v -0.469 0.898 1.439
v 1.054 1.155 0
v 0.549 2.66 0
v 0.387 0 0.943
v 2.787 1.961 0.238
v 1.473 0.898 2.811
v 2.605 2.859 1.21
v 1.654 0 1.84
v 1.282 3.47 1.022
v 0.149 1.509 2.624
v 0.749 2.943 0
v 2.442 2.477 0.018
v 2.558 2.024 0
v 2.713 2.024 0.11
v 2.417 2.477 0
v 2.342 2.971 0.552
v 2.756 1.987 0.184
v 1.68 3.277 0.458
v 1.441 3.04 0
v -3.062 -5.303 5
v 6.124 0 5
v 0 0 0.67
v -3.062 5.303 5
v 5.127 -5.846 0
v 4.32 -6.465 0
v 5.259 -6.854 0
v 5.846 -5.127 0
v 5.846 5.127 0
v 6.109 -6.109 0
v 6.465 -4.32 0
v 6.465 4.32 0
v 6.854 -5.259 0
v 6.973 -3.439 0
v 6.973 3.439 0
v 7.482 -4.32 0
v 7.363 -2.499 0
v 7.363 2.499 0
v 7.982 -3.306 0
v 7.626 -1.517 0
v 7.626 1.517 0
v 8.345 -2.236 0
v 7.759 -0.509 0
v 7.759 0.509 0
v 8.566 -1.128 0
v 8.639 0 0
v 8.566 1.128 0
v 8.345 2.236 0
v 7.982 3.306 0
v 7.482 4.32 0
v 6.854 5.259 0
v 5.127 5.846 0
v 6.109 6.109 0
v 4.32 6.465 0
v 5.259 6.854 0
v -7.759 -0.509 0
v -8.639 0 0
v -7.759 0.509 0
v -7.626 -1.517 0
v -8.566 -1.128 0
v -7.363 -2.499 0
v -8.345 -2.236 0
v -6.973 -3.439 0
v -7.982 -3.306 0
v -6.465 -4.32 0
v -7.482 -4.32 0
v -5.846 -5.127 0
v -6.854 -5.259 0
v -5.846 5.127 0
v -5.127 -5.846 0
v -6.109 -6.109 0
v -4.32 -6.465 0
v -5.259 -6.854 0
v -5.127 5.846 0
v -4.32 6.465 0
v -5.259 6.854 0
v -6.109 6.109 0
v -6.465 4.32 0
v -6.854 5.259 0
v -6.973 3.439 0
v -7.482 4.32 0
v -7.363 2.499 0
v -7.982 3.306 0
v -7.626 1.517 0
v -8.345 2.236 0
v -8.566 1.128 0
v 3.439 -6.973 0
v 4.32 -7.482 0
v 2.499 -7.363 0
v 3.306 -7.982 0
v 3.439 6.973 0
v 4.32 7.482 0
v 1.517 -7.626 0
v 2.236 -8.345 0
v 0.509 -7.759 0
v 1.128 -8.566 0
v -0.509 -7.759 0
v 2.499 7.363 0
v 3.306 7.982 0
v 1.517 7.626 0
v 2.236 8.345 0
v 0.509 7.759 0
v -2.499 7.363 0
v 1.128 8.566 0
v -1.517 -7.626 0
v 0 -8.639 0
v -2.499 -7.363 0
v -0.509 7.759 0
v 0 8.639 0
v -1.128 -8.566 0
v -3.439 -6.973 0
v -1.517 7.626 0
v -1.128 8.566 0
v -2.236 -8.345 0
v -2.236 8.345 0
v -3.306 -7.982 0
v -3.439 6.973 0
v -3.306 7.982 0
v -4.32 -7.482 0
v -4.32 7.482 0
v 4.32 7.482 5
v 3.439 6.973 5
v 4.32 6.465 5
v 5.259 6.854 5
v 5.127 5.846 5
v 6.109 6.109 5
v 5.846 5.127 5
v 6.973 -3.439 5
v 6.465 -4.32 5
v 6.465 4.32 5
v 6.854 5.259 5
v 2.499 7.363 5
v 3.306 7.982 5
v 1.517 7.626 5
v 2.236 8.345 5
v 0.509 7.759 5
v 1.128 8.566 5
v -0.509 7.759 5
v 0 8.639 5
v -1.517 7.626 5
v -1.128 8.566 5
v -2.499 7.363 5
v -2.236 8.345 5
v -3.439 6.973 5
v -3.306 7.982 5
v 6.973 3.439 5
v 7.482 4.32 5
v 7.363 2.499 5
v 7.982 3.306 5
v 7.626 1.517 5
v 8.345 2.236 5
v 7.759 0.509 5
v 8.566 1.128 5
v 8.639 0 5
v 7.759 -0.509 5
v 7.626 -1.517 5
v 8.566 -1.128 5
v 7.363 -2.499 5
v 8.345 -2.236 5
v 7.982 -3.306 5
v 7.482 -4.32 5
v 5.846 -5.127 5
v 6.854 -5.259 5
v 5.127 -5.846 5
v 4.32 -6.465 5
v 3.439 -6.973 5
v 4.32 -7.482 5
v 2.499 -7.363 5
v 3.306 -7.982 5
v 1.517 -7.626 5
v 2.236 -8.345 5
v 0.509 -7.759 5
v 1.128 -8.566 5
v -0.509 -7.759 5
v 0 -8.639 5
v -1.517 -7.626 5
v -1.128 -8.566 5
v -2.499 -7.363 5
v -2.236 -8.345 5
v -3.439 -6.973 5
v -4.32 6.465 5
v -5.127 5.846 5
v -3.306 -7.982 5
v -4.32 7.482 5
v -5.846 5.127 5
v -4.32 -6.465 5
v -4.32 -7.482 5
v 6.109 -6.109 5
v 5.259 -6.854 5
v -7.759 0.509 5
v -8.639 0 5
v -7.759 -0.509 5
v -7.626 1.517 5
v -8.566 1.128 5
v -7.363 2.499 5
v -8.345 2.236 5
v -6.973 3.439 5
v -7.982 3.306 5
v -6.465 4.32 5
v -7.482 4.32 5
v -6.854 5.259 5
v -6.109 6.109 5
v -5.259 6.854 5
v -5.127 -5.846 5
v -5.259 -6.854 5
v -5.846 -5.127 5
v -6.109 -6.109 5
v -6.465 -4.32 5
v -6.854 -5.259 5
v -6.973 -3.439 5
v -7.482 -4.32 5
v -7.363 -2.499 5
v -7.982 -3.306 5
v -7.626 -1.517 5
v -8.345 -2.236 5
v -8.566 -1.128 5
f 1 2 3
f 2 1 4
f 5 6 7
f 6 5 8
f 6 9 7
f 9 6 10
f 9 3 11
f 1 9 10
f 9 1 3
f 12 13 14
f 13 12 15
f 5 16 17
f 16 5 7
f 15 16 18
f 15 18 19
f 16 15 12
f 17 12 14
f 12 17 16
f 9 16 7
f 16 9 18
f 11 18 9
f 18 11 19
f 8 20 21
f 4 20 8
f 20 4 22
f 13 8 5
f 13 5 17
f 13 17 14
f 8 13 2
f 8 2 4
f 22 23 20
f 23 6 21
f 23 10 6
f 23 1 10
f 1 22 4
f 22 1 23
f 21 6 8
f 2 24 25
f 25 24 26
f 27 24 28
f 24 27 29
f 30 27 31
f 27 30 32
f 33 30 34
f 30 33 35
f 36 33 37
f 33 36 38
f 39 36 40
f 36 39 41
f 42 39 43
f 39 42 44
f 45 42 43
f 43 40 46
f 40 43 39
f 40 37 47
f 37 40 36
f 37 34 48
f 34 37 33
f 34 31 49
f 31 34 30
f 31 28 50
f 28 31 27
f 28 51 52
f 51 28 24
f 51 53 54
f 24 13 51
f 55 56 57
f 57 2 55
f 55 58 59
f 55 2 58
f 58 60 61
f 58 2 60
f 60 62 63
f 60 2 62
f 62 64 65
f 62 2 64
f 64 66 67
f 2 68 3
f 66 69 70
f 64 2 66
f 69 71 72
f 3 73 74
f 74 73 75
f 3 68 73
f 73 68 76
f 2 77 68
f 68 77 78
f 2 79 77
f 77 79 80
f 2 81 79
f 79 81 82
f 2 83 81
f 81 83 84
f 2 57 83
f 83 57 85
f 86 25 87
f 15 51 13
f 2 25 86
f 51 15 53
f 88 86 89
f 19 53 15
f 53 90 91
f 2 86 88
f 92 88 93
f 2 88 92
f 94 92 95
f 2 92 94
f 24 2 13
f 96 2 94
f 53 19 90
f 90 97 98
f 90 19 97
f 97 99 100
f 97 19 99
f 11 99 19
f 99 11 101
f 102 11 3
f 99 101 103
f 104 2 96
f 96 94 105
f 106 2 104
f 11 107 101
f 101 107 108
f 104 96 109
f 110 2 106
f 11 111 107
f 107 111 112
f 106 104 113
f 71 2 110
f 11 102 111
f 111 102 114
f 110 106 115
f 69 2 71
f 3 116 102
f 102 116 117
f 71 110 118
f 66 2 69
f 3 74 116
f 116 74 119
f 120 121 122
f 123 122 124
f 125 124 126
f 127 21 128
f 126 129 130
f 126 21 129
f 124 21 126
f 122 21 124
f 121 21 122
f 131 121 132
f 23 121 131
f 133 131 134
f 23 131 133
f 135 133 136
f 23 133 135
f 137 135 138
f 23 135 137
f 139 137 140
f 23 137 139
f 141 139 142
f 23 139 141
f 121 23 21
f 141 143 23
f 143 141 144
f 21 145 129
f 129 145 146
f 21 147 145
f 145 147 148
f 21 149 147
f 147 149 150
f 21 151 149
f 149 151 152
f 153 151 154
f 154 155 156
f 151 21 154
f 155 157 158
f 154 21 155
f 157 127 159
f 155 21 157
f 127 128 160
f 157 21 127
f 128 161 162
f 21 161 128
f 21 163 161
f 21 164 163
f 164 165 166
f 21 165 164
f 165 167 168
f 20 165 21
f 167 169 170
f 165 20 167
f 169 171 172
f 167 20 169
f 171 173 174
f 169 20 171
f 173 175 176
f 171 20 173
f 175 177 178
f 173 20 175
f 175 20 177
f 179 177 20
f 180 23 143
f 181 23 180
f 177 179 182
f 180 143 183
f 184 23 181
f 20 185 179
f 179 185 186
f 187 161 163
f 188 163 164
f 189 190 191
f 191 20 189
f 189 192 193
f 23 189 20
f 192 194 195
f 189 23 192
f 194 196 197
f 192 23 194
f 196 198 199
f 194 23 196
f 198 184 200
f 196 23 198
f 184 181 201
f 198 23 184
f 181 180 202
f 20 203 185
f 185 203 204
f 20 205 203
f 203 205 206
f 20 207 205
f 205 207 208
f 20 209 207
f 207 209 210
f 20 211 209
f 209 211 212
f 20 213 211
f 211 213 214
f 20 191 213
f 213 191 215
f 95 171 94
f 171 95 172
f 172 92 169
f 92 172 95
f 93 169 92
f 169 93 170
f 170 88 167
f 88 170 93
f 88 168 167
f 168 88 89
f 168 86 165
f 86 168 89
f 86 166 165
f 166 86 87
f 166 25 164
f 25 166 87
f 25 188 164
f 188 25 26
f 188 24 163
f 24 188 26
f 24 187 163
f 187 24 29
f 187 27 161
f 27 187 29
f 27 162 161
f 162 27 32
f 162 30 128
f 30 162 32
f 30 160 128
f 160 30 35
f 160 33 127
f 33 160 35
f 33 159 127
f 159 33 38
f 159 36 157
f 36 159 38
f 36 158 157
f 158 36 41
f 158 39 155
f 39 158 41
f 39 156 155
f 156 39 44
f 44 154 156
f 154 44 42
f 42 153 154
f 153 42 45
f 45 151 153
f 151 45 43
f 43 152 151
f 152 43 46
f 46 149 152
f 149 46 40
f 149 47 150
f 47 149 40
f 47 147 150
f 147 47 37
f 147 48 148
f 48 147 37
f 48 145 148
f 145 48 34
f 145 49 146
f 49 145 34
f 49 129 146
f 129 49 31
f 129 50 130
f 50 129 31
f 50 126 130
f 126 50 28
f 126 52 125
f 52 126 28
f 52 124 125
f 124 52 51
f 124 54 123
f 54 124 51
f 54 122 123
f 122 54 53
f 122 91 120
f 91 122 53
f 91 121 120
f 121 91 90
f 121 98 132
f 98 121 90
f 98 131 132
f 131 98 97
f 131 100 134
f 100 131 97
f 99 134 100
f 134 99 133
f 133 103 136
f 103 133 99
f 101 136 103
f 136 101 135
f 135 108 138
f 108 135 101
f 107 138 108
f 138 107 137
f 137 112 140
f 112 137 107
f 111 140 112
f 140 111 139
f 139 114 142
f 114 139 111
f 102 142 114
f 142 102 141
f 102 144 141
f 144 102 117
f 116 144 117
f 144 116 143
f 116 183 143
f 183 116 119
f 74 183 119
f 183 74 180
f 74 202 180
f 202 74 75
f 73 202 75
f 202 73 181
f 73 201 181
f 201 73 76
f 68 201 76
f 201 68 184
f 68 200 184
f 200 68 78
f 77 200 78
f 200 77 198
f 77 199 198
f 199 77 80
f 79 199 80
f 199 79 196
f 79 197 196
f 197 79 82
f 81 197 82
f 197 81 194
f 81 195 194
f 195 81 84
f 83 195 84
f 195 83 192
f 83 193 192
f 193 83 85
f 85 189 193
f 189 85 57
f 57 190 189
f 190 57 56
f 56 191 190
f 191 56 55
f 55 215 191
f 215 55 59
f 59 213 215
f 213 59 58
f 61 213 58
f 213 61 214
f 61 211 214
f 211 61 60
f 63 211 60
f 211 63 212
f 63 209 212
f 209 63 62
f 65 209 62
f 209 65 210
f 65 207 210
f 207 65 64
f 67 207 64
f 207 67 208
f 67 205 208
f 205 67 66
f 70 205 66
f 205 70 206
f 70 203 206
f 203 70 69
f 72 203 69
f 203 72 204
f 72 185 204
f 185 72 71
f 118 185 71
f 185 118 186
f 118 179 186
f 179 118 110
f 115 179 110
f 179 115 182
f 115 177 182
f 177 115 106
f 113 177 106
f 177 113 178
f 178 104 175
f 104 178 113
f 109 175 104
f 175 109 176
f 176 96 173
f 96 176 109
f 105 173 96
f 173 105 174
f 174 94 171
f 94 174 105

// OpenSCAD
// file: belt.scad
/**
 * Copyright 2018 Mike and Nathan Fairhurst. See LICENSE for licensing.
 */
include <constants.scad>;
use <util.scad>;

// Begin how to print this piece (orientation, etc)

// Begin modules that can be used to assemble this piece in solver_3.scad

// A simple belt preview module. Simply accepts some number of gears, and
// builds a belt that connects them.
//
// Example: a 2mm thick belt connecting three gears in a square
//   belt(2) mirrored([x, y]) gear(.5, 30, 5);
//
// Doesn't yet draw the teeth, and makes some assumptions:
// - Assumes all gears are level in the z axis
// - Assumes all gears are the same thickness
// - Has the same limitations as [hull] (assumes no backtracking).
module belt(size=2) {
  difference() {
    hull() minkowski() {
      children();
      cylinder(0.00001, r=size);
    }
    down(0.1) scale([1,1,2]) hull() children();
  }
}

// This an approximation for a transcendental equation, but seems to work well
// see this post: https://math.stackexchange.com/questions/123361
function gear_center_distance(belt_length, gear_size1, gear_size2) =
  let(diff=abs(gear_size1 - gear_size2))
  let(tangent_length=
    (belt_length - PI*diff + sqrt(sqr(PI*diff - belt_length) - 16*sqr(diff))) / 4)
  sqrt(sqr(diff) + sqr(tangent_length));
// file: arm.scad
/**
 * Copyright 2018 Mike and Nathan Fairhurst. See LICENSE for licensing.
 */
include <constants.scad>;
use <util.scad>;
use <gear.scad>;

// Begin config specific to this piece.
arm_length = 100;
width = 20;
grip_width = 2;
extend_retract_gear_size = 1;

// Begin how to print this piece (orientation, etc)
rotate([0, 90, 0]) arm();

// Begin modules that can be used to assemble this piece in solver_3.scad
module arm(include_gears=true) {
  rotate([0, 270, 0]) {
    translate([0, 0, cube_size/2])
      if (include_gears)
        opposing_gears(arm_length, width, extend_retract_gear_size);
      else cylinder(d=width, arm_length);
    difference() {
      translate([0, 0, cube_size/3/2 + grip_width / 2])
        ccube([
          cube_size + grip_width * 2,
          cube_size / 3,
          cube_size/3 * 2 + grip_width
        ], x + y + z);
      ccube(cube_size, x + y + z);
    }
  }

}

module opposing_gears(length, width, extend_retract_gear_size) {
  intersection() {
    fixed_outer_size_gear(width, 10, length);
    ccube([width, width, length], y);
  }
  difference() {
    movable_cylinder(extend_retract_gear_size, width, length);
    ccube([width, width, length], y);
  }
}

module movable_cylinder(teeth_size = 1, width = width, length=arm_length) {
  iters = floor(length / teeth_size);

  radial_offset = gear_tooth_additional_radius(teeth_size) + teeth_size /2;

  intersection() {
    // restrict to the actual length
    ccube([width, width, length], x+y);
    // each tooth
    for (i=[0:iters]) {
      up(i * teeth_size)
      rotate_extrude()
      translate([width / 2 - radial_offset, 0, 0])
      circle(teeth_size, $fn=3);
    }
  }

  // without this its hollow
  cylinder(r=width / 2 - radial_offset, h=length);
}
// file: pin.scad
/**
 * Copyright 2018 Mike and Nathan Fairhurst. See LICENSE for licensing.
 */
include <constants.scad>;
use <util.scad>;

pin(10,2);

// A shape that can be used for push in parts
module pin(height, radius) {
  inner_height = height * 0.9375;
  cap_height = height - inner_height;
  difference() {
    translate([radius*sqrt(2)/2, 0, 0])
      union() {
        cylinder(h=inner_height, r=radius);
        up(inner_height)
          cylinder(h=cap_height, r1=radius, r2=radius/2);
      }
    translate([-height*2, 0, 0])
      ccube(height*2, y + z);
  }
}
// file: frame.scad
/**
 * Copyright 2018 Mike and Nathan Fairhurst. See LICENSE for licensing.
 */
include <constants.scad>;
use <util.scad>;
use <cube_holder.scad>;
use <arm.scad>;
use <belt.scad>;

thickness = 4;
width = 30;
height_at_front = 120;
height_at_back = 140;
cube_to_arm_gap = 60;
cube_to_arm_len = 80;

cube_spinner_belt_size = 120;

cube_spinner_servo_gear_center_distance = gear_center_distance(
                                cube_spinner_belt_size,
                                servo_gear_thickness,
                                servo_gear_thickness * 2);

cube_spinner_servo_offset = sqrt(sqr(cube_spinner_servo_gear_center_distance), sqr(width + servo_block_size[1]/2));

cube_spinner_servo_support_offset = servo_block_size[0]/2 + servo_screw_offsets[1]/2;
cube_spinner_servo_support_height = servo_gear_thickness
                           + servo_flange_offset
                           + thickness
                           - servo_flange_thickness;

// Begin how to print this piece (orientation, etc)
rotate([90, 0, 0]) frame();

// Begin modules that can be used to assemble this piece in solver_3.scad

module above_frame() {
  up(thickness) children();
}

module frame() {
  translate([-width/2, 0, 0])
    ccube([cube_to_arm_len + width/2, width, thickness], y);
  translate([cube_spinner_servo_offset - cube_spinner_servo_support_offset, 0, 0])
    cube_spinner_servo_support();
  translate([cube_spinner_servo_offset + cube_spinner_servo_support_offset, 0, 0])
    cube_spinner_servo_support();
  difference() {
    union() {
      translate([cube_to_arm_gap, 0, 0])
        ccube([thickness, width, height_at_front], y);
      translate([cube_to_arm_len, 0, 0])
        ccube([thickness, width, height_at_back], y);
    }
    above_cube_holder() onto_point(cube_size) arm(include_gears=false, $fn=100);
  }
}

module cube_spinner_servo_support() {
  to_center([0, width, 0], y) {
      ccube([thickness, width / 2, cube_spinner_servo_support_height], x);
    translate([0, 0, cube_spinner_servo_support_height - thickness])
      ccube([thickness, width + servo_block_size[1], thickness], x);
  }
}

module cube_spinner_servo_placement() {
  translate([cube_spinner_servo_offset, width/2 + servo_block_size[1]/2, 0])
    rotate([0, 180, 0])
    children();
}
// file: cube_holder.scad
/**
 * Copyright 2018 Mike and Nathan Fairhurst. See LICENSE for licensing.
 */
include <constants.scad>;
use <util.scad>;
use <frame.scad>;
use <pin.scad>;

// Begin config specific to this piece.
margin = 0.5;
thickness = 2.5;
embedded_thickness = 1;

// Begin how to print this piece (orientation, etc)
cube_holder();

// Begin modules that can be used to assemble this piece in solver_3.scad

module above_cube_holder() {
  up(servo_gear_thickness) above_frame() children();
}

module cube_holder(hollow=true) {
  piece_size = cube_size / 3 + margin;
  holder_open_size = piece_size + thickness;
  holder_closed_size = piece_size + thickness + embedded_thickness;
  translate([-piece_size/2,piece_size/2,piece_size/2]) {
    difference() {
      translate([thickness/2, (embedded_thickness-thickness)/2, (embedded_thickness-thickness)/2])
        ccube([holder_open_size, holder_closed_size, holder_closed_size], x+y+z);
      if (hollow) {
        rounded_cube(piece_size, cube_rounding, x+y+z);
        translate([-thickness, 0, 0]) rounded_cube(piece_size, cube_rounding, x+y+z);
        onto_point()
          translate([0, 0, holder_closed_size])
          ccube(holder_open_size, x+y+z);
      }
    }
  }
  pin_radius = thickness/2;
  translate([thickness - pin_radius, 0, -thickness])
    rotate(90, x) // rotate the pin so it prints flat
    rotate(90, z) // turn the pin so that it lays on a face
    pin(thickness*9/4, pin_radius);
}
// file: gear.scad
/**
 * Copyright 2018 Mike and Nathan Fairhurst. See LICENSE for licensing.
 */
include <constants.scad>;
use <util.scad>;

// Begin how to print this piece (orientation, etc)

// Begin modules that can be used to assemble this piece in solver_3.scad

// Get the size of a gear (circumference) without the teeth,
// based on teeth size and num teeth
function gear_inner_circumference(teeth_size, num_teeth)
  = teeth_size * num_teeth;

// Get the size of a gear (radius) without the teeth, based on
// teeth size and num teeth
function gear_inner_radius(teeth_size, num_teeth)
  = gear_inner_circumference(teeth_size, num_teeth) / 3.14159 / 2;

// Get the size of a gear (radius) including the teeth, based on
// teeth size and num teeth
function gear_outer_radius(teeth_size, num_teeth)
  = gear_inner_radius(teeth_size, num_teeth)
    + gear_tooth_additional_radius(teeth_size);

// Get the size of a gear tooth such that it is on a gear with num_teeth
// and fits inside (teeth included) outer_radius.
function gear_size_for_outer_radius_and_teeth_count(outer_radius, num_teeth)
  = let(basic_teeth_size = other_radius*2 / num_teeth)
    basic_teeth_size
    * ((outer_radius - gear_tooth_additional_radius(basic_teeth_size))
       / outer_radius);

// Get the additional radius on a gear by its tooth size. Since
// these are right triangles, we simply cut one side in half to get
// a right angle and use pythag.
function gear_tooth_additional_radius(tooth_size)
  = sqrt(sqr(tooth_size) - sqr(tooth_size/2));

// Create a gear based on number and size of teeth
module gear(teeth_size, num_teeth, thickness) {
  radius = gear_inner_radius(teeth_size, num_teeth);
  linear_extrude(thickness) {
    circle(radius, $fn=num_teeth);
    for (i=[1:num_teeth]) {
      rotate([0, 0, 360/num_teeth*i]) translate([radius, 0]) circle(teeth_size, $fn=3);
    }
  }
}

// A gear which must fit some number of teeth within some outer radius,
// accepts a number of teeth and a thickness as well.
module fixed_outer_size_gear(outer_radius, num_teeth, thickness) {
  basic_teeth_size = outer_radius*2 / num_teeth;
  inner_gear_size = outer_radius - gear_tooth_additional_radius(basic_teeth_size);
  adjustment_ratio = inner_gear_size / outer_radius;
  gear(basic_teeth_size * adjustment_ratio, num_teeth, thickness);
}
// file: util.scad
/**
 * Copyright 2018 Mike and Nathan Fairhurst. See LICENSE for licensing.
 */

function is_number(x) = abs(x)!=undef;
function sqr(x) = x*x;
function sqrt(x) = pow(x, 0.5);

// Constants specific to this file
cube_point_rotation = [45, 35.264, 180];

// Modules to be used by all parts

// Create a cube balanced on a point. If you want a specialty
// cube, you can use [onto_point] and pass in the size.
module cube_on_point(cube_size) {
  onto_point(cube_size) cube(cube_size, center=true);
}

// Wrap around a cube of [size], and it will be placed on a
// point. Make sure size is accurate, or, when you can, use
// [cube_on_point].
module onto_point(cube_size) {
  translate([0, 0, pow(pow(cube_size/2, 2)*3, 1/2)])
    rotate(cube_point_rotation)
    children();
}

// A cube with rounded corners, with centering available as
// well, via [ccube].
module rounded_cube(size, rounding, center) {
  //realdims = is_number(dims) ? [dims, dims, dims] : dims;
  minkowski() {
    ccube(size - rounding*2, center);
    sphere(r=rounding, center=true, $fn=10);
  }
}

// Move children up by z. Just cleaner than creating a 3d
// vector transform.
module up(z) {
  translate([0, 0, z]) children();
}

// Move children down by z. Just cleaner than creating a 3d
// vector transform.
module down(z) {
  translate([0, 0, -z]) children();
}

// Convenience function for creating a partially centered cube.
//
// [ccube] stands for "centered cube." Rather than having only
// two options (center on all axes or none), the axes upon which
// the cube should be centered can be passed in via the
// constants [x], [y], and [z], from constants.scad. Note you
// can add & subtract these values for a clean API.
//
// Based on [to_center], so if you don't want a cube, or want
// to recreate the transformation of a different [ccube], you
// can use that.
//
// Example: a cube of width 10, centered on x & y
//   ccube(10, x + y)
module ccube(dims, axes) {
  to_center(dims, axes) cube(dims);
}

// The transformation of [ccube], abstracted so that it can be
// used for shapes other than a regular cube.
module to_center(dims, axes) {
  realdims = is_number(dims) ? [dims, dims, dims] : dims;
  translate([
    -realdims[0]/2 * axes[0], 
    -realdims[1]/2 * axes[1], 
    -realdims[2]/2 * axes[2]
  ]) children();
}

// Take a child, and mirror it along the sets of vectors provided. The
// vectors can be the constants [x], [y], and [z] from constants.scad.
//
// Example: Four cubes, evenly mirrored around x and y
//   mirrored([x, y]) translate([10, 10, 0]) cube(1);
module mirrored(vector_set, index = 0) {
  if (index != len(vector_set)) {
    mirror(vector_set[index]) mirrored(vector_set, index + 1) children();
    mirrored(vector_set, index + 1) children();
  } else {
    children();
  }
}
// file: constants.scad
/**
 * Copyright 2018 Mike and Nathan Fairhurst. See LICENSE for licensing.
 */

// Constants to be used by all models
cube_size = 56.5;
$tol = 0.4;
layer_count = 3;
cube_rounding = 1;
servo_block_size=[26.5,15,30];
servo_flange_length=13;
servo_flange_thickness=1.5;
servo_flange_offset=8;
servo_screw_offsets=[3, 5];
servo_screw_size = 4;
servo_gear_teeth_size = 1;
servo_gear_num_teeth = 12;
servo_gear_thickness = 5;

// Dimensional values for use with [ccube], etc.
x = [1, 0, 0];
y = [0, 1, 0];
z = [0, 0, 1];
// main file
/**
 * Copyright 2018 Mike and Nathan Fairhurst. See LICENSE for licensing.
 */
include <constants.scad>;
use <util.scad>;
use <gear.scad>;
use <cube_holder.scad>;

cube_holder_gear();

module cube_holder_gear() {
  difference() {
    gear(servo_gear_teeth_size, servo_gear_num_teeth*4, servo_gear_thickness);
    up(servo_gear_thickness) onto_point() cube_holder(hollow=false);
  }
}
